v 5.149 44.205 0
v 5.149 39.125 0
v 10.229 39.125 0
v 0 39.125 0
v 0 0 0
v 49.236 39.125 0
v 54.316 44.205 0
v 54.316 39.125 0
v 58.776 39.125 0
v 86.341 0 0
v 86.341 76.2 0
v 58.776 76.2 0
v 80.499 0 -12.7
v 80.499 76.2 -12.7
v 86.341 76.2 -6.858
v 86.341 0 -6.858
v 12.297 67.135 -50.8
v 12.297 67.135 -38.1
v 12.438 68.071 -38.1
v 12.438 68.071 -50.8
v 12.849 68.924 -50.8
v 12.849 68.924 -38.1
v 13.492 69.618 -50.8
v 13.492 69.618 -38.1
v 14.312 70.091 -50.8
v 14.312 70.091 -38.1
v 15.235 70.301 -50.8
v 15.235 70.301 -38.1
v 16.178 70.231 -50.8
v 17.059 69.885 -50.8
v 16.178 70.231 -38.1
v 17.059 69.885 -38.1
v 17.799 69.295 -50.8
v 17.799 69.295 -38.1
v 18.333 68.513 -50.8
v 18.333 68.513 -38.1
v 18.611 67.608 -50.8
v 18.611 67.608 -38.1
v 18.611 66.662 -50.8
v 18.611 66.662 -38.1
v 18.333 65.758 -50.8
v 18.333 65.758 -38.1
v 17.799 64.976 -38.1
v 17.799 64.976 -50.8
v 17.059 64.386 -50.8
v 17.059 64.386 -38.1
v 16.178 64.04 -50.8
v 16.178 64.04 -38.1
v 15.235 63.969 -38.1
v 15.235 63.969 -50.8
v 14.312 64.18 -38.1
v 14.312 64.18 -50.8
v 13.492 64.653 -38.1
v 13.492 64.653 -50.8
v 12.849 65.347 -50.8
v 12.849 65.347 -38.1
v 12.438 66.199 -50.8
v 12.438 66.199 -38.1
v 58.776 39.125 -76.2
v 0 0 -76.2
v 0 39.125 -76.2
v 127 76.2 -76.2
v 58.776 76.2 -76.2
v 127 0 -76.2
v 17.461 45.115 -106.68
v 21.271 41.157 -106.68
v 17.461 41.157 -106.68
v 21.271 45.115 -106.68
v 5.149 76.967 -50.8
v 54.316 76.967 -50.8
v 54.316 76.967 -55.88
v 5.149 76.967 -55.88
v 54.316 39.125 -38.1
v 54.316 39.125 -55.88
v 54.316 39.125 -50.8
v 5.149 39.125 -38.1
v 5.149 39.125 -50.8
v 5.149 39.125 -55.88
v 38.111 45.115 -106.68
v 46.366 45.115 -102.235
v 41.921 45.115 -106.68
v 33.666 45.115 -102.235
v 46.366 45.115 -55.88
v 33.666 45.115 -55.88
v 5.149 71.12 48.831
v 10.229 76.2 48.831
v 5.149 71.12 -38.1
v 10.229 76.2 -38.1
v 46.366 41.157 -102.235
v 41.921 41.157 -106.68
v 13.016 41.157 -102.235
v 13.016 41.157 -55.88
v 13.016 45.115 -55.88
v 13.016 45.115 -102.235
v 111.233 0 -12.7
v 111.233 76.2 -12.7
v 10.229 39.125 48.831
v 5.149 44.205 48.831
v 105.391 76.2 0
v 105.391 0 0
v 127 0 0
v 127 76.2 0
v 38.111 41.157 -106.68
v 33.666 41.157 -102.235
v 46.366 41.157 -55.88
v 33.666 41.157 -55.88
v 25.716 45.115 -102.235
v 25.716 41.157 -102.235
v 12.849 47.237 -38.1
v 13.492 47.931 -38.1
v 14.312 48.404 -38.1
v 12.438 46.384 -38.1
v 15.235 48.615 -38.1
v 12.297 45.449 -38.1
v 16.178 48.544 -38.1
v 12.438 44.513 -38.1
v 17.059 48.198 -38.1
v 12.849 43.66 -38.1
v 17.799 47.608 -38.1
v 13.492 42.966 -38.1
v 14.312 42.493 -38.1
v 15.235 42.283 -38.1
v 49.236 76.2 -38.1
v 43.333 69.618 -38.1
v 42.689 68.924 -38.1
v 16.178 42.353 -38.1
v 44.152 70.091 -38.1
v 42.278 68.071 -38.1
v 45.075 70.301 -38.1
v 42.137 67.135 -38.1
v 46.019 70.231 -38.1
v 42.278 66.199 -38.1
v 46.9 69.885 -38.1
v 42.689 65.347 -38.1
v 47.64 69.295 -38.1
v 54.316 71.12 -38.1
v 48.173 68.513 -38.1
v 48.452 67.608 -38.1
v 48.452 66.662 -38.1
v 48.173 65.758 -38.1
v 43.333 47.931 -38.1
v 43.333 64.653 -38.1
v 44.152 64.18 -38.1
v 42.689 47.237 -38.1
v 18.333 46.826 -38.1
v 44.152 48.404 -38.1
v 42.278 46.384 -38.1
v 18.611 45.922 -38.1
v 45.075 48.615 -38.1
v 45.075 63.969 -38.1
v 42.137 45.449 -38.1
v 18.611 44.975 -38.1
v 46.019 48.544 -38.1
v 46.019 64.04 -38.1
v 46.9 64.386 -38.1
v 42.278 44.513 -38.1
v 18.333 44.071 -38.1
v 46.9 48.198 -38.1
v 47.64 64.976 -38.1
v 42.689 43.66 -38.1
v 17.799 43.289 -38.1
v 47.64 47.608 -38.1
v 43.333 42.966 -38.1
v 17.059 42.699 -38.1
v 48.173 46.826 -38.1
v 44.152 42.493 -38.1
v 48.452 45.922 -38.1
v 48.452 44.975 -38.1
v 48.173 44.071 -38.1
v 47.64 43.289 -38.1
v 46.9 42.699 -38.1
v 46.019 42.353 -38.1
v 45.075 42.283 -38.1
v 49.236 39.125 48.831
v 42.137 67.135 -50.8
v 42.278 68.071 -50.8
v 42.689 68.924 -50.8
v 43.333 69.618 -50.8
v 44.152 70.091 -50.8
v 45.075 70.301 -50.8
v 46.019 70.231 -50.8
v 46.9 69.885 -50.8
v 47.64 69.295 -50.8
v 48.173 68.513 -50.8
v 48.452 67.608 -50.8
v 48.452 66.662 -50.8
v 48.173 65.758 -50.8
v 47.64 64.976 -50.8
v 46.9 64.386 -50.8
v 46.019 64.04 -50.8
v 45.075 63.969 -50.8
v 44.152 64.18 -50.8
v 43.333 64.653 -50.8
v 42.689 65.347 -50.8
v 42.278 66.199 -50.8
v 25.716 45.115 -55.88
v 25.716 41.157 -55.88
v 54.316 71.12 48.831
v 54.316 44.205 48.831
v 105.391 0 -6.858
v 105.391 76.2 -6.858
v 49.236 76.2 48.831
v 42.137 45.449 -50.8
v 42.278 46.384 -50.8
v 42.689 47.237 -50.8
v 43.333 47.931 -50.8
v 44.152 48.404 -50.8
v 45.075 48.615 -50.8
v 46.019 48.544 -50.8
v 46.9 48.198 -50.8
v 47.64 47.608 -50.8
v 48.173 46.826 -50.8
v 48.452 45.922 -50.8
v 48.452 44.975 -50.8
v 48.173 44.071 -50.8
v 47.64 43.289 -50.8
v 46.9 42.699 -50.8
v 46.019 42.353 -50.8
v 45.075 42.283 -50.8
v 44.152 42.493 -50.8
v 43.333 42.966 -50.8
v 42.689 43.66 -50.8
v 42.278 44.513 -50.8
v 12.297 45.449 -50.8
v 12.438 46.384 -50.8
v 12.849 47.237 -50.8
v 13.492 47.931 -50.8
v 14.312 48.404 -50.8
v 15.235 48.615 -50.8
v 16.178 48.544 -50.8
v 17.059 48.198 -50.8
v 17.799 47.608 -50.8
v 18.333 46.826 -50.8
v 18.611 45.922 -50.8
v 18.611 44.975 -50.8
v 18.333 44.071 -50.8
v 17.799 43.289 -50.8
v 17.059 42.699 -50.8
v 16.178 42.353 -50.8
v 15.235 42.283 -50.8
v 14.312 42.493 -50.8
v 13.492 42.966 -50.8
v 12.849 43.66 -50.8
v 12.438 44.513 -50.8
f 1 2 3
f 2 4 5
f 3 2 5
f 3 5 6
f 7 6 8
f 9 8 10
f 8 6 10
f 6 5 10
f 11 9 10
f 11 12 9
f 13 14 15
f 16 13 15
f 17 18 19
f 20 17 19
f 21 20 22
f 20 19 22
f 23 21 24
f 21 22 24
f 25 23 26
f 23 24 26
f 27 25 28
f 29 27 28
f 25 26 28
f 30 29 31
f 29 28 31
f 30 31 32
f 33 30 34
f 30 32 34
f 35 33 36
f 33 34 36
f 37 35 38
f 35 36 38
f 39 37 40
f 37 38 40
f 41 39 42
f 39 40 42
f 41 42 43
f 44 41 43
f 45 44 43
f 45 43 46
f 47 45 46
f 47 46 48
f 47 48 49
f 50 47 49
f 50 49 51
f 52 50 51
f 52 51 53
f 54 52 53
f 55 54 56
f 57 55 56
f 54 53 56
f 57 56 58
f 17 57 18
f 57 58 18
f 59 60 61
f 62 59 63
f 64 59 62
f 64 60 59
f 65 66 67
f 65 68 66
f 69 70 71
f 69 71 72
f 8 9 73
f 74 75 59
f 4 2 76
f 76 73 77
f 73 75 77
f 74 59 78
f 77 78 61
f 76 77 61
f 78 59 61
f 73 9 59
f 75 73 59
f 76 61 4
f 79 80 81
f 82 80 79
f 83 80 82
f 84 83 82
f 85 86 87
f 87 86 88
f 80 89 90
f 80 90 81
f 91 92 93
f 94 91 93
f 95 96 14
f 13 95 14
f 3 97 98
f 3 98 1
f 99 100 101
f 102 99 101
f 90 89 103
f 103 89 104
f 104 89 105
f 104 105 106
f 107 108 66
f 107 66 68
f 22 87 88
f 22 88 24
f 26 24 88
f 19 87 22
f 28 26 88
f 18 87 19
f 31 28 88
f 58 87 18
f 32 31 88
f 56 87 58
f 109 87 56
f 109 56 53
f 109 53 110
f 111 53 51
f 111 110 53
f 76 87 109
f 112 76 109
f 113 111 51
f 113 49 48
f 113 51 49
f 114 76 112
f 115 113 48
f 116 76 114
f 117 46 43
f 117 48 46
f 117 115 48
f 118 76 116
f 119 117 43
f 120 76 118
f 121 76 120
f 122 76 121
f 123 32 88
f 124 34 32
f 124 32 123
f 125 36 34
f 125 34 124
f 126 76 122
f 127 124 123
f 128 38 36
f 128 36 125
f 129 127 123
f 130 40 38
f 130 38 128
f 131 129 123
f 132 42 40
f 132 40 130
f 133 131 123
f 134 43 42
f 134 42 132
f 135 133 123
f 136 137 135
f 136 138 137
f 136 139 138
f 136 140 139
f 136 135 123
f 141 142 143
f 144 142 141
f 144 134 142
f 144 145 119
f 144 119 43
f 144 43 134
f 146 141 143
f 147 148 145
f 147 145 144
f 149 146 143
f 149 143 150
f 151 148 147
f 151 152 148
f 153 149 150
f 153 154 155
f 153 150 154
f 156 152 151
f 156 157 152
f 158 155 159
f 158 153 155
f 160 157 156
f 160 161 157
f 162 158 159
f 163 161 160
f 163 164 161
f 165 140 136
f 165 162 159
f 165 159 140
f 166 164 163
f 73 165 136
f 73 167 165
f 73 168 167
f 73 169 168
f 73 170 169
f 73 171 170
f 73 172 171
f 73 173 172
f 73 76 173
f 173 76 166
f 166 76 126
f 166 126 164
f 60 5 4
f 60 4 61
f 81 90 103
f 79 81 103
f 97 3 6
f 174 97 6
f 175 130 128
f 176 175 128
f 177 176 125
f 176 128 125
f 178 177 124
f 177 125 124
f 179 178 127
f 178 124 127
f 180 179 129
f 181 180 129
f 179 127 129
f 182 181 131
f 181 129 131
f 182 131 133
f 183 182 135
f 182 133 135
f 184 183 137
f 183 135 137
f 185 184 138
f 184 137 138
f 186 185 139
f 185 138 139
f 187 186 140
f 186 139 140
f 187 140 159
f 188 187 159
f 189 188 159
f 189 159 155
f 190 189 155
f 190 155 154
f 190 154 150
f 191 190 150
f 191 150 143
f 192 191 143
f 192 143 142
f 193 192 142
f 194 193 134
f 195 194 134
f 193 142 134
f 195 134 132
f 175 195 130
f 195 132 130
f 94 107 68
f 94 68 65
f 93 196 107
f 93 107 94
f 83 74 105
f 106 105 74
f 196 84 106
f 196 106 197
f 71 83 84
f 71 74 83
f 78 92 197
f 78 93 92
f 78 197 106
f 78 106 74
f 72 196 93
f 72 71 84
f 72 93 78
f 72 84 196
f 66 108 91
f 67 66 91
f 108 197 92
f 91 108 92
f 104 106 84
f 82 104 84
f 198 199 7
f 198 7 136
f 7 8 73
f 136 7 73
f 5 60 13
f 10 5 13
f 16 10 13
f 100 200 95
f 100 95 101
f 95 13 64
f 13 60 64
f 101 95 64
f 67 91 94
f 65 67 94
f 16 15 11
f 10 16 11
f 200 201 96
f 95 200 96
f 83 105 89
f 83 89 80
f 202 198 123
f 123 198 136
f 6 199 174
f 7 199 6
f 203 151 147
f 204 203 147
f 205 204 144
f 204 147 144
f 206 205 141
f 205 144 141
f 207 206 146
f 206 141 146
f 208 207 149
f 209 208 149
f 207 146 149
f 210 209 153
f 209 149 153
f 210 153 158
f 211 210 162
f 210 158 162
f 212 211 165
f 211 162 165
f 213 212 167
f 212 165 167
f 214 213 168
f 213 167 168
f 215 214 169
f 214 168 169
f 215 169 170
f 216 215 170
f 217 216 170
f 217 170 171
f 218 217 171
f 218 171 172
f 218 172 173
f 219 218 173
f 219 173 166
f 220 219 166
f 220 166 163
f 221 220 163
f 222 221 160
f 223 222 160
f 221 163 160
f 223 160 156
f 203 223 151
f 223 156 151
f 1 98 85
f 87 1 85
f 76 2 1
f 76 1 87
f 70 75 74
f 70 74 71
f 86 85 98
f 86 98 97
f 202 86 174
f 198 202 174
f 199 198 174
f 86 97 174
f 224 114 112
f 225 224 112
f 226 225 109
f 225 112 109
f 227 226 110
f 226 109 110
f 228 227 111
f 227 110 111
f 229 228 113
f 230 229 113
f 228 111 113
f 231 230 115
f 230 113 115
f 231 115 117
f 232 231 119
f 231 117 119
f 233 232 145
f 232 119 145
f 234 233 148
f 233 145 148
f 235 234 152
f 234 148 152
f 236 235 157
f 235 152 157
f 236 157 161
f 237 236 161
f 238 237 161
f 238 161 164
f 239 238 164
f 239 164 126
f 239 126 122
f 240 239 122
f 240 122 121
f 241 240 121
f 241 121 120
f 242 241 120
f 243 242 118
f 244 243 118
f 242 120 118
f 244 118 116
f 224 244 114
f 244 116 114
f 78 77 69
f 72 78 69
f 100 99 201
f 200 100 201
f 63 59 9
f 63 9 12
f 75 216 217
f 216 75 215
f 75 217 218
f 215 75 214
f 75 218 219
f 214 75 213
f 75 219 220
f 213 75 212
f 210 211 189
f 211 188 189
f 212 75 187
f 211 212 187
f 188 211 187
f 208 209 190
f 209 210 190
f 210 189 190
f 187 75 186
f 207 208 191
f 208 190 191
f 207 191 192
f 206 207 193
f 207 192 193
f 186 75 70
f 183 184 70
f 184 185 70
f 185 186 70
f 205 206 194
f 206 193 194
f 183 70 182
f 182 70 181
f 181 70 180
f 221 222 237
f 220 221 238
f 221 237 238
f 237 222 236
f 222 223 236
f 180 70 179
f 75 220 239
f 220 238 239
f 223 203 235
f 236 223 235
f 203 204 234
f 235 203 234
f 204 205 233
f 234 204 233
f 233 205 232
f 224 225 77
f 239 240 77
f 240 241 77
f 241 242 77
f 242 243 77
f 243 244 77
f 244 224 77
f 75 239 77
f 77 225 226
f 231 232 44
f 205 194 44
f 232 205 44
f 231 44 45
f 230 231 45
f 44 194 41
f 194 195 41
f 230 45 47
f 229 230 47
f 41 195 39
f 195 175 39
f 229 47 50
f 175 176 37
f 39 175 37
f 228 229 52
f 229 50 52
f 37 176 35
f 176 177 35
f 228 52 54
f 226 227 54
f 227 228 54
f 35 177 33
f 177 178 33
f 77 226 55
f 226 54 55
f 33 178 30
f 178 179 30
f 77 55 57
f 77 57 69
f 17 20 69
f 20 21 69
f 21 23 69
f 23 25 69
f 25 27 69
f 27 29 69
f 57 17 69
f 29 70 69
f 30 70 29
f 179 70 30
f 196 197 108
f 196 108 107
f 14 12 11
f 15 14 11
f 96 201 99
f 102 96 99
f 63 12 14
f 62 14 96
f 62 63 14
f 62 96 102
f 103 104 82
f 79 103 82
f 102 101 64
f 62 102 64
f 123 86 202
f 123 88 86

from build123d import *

# Parameters (mm, degrees)
SKETCH1_W           = 127
SKETCH1_H           = 76.2
BOSS_EXTRUDE1_DEPTH = 76.2
CUT_EXTRUDE1_DEPTH  = 77.2
SKETCH3_W           = 58.776435242
SKETCH3_H           = 37.074512471
CUT_EXTRUDE2_DEPTH  = 77.2
SKETCH4_W           = 49.167351348
SKETCH4_H           = 86.931479723
BOSS_EXTRUDE3_DEPTH = 37.074512
CHAMFER1_SIZE       = 5.08
SKETCH5_R           = 3.175
BOSS_EXTRUDE4_DEPTH = 12.7
SKETCH6_W           = 49.167351348
SKETCH6_H           = 37.84167341
BOSS_EXTRUDE5_DEPTH = 5.08
SKETCH7_W           = 12.7
SKETCH7_H           = 3.957251341
BOSS_EXTRUDE6_DEPTH = 50.8
CHAMFER2_SIZE       = 4.445


with BuildPart() as part:
    # Sketch1 → Boss-Extrude1 (new body)
    with BuildSketch(Plane(origin=(0, 0, 0), x_dir=(1, 0, 0), z_dir=(0, 1, 0))):
        with Locations((63.5, 38.1)):
            Rectangle(SKETCH1_W, SKETCH1_H)
    extrude(amount=BOSS_EXTRUDE1_DEPTH)

    # Sketch2 → Cut-Extrude1 (cut, through all)
    with BuildSketch(Plane(origin=(0, 76.2, 0), x_dir=(1, 0, 0), z_dir=(0, 1, 0))):
        Polygon((86.341048303, 0), (105.391048303, 0), (105.391048303, 6.858), (111.233048303, 12.7), (80.499048303, 12.7), (86.341048303, 6.858), align=None)
    extrude(amount=-CUT_EXTRUDE1_DEPTH, mode=Mode.SUBTRACT)

    # Sketch3 → Cut-Extrude2 (cut, through all)
    with BuildSketch(Plane(origin=(0, 0, -76.2), x_dir=(-1, 0, 0), z_dir=(0, 0, -1))):
        with Locations((-29.388217621, 57.662743765)):
            Rectangle(SKETCH3_W, SKETCH3_H)
    extrude(amount=-CUT_EXTRUDE2_DEPTH, mode=Mode.SUBTRACT)

    # Sketch4 → Boss-Extrude3 (add)
    with BuildSketch(Plane(origin=(0, 39.125487529, 0), x_dir=(1, 0, 0), z_dir=(0, 1, 0))):
        with Locations((29.732558923, -5.365739861)):
            Rectangle(SKETCH4_W, SKETCH4_H)
    extrude(amount=BOSS_EXTRUDE3_DEPTH)

    # Chamfer1
    chamfer1_edges = [part.edges().sort_by_distance(p)[0] for p in [
        (5.148883249, 76.199999529, 5.365739861),
        (5.148883249, 39.125487529, 24.415739861),
        (54.316234597, 76.199999529, 5.365739861),
        (54.316234597, 39.125487529, 24.415739861),
    ]]
    chamfer(chamfer1_edges, length=CHAMFER1_SIZE)

    # Sketch5 → Boss-Extrude4 (add)
    with BuildSketch(Plane(origin=(0, 0, -38.1), x_dir=(-1, 0, 0), z_dir=(0, 0, -1))):
        with Locations((-45.312372158, 67.135265035)):
            Circle(SKETCH5_R)
        with Locations((-15.471955986, 67.135265035)):
            Circle(SKETCH5_R)
        with Locations((-45.312372158, 45.448629278)):
            Circle(SKETCH5_R)
        with Locations((-15.471955986, 45.448629278)):
            Circle(SKETCH5_R)
    extrude(amount=BOSS_EXTRUDE4_DEPTH)

    # Sketch6 → Boss-Extrude5 (add)
    with BuildSketch(Plane(origin=(0, 0, -50.8), x_dir=(-1, 0, 0), z_dir=(0, 0, -1))):
        with Locations((-29.732558923, 58.046324234)):
            Rectangle(SKETCH6_W, SKETCH6_H)
    extrude(amount=BOSS_EXTRUDE5_DEPTH)

    # Sketch7 → Boss-Extrude6 (add)
    with BuildSketch(Plane(origin=(0, 0, -55.88), x_dir=(-1, 0, 0), z_dir=(0, 0, -1))):
        with Locations((-40.016034597, 43.1361132)):
            Rectangle(SKETCH7_W, SKETCH7_H)
        with Locations((-19.365834597, 43.1361132)):
            Rectangle(SKETCH7_W, SKETCH7_H)
    extrude(amount=BOSS_EXTRUDE6_DEPTH)

    # Chamfer2
    chamfer2_edges = [part.edges().sort_by_distance(p)[0] for p in [
        (46.366034597, 43.1361132, -106.68),
        (33.666034597, 43.1361132, -106.68),
        (25.715834597, 43.1361132, -106.68),
        (13.015834597, 43.1361132, -106.68),
    ]]
    chamfer(chamfer2_edges, length=CHAMFER2_SIZE)


solid = part.part
